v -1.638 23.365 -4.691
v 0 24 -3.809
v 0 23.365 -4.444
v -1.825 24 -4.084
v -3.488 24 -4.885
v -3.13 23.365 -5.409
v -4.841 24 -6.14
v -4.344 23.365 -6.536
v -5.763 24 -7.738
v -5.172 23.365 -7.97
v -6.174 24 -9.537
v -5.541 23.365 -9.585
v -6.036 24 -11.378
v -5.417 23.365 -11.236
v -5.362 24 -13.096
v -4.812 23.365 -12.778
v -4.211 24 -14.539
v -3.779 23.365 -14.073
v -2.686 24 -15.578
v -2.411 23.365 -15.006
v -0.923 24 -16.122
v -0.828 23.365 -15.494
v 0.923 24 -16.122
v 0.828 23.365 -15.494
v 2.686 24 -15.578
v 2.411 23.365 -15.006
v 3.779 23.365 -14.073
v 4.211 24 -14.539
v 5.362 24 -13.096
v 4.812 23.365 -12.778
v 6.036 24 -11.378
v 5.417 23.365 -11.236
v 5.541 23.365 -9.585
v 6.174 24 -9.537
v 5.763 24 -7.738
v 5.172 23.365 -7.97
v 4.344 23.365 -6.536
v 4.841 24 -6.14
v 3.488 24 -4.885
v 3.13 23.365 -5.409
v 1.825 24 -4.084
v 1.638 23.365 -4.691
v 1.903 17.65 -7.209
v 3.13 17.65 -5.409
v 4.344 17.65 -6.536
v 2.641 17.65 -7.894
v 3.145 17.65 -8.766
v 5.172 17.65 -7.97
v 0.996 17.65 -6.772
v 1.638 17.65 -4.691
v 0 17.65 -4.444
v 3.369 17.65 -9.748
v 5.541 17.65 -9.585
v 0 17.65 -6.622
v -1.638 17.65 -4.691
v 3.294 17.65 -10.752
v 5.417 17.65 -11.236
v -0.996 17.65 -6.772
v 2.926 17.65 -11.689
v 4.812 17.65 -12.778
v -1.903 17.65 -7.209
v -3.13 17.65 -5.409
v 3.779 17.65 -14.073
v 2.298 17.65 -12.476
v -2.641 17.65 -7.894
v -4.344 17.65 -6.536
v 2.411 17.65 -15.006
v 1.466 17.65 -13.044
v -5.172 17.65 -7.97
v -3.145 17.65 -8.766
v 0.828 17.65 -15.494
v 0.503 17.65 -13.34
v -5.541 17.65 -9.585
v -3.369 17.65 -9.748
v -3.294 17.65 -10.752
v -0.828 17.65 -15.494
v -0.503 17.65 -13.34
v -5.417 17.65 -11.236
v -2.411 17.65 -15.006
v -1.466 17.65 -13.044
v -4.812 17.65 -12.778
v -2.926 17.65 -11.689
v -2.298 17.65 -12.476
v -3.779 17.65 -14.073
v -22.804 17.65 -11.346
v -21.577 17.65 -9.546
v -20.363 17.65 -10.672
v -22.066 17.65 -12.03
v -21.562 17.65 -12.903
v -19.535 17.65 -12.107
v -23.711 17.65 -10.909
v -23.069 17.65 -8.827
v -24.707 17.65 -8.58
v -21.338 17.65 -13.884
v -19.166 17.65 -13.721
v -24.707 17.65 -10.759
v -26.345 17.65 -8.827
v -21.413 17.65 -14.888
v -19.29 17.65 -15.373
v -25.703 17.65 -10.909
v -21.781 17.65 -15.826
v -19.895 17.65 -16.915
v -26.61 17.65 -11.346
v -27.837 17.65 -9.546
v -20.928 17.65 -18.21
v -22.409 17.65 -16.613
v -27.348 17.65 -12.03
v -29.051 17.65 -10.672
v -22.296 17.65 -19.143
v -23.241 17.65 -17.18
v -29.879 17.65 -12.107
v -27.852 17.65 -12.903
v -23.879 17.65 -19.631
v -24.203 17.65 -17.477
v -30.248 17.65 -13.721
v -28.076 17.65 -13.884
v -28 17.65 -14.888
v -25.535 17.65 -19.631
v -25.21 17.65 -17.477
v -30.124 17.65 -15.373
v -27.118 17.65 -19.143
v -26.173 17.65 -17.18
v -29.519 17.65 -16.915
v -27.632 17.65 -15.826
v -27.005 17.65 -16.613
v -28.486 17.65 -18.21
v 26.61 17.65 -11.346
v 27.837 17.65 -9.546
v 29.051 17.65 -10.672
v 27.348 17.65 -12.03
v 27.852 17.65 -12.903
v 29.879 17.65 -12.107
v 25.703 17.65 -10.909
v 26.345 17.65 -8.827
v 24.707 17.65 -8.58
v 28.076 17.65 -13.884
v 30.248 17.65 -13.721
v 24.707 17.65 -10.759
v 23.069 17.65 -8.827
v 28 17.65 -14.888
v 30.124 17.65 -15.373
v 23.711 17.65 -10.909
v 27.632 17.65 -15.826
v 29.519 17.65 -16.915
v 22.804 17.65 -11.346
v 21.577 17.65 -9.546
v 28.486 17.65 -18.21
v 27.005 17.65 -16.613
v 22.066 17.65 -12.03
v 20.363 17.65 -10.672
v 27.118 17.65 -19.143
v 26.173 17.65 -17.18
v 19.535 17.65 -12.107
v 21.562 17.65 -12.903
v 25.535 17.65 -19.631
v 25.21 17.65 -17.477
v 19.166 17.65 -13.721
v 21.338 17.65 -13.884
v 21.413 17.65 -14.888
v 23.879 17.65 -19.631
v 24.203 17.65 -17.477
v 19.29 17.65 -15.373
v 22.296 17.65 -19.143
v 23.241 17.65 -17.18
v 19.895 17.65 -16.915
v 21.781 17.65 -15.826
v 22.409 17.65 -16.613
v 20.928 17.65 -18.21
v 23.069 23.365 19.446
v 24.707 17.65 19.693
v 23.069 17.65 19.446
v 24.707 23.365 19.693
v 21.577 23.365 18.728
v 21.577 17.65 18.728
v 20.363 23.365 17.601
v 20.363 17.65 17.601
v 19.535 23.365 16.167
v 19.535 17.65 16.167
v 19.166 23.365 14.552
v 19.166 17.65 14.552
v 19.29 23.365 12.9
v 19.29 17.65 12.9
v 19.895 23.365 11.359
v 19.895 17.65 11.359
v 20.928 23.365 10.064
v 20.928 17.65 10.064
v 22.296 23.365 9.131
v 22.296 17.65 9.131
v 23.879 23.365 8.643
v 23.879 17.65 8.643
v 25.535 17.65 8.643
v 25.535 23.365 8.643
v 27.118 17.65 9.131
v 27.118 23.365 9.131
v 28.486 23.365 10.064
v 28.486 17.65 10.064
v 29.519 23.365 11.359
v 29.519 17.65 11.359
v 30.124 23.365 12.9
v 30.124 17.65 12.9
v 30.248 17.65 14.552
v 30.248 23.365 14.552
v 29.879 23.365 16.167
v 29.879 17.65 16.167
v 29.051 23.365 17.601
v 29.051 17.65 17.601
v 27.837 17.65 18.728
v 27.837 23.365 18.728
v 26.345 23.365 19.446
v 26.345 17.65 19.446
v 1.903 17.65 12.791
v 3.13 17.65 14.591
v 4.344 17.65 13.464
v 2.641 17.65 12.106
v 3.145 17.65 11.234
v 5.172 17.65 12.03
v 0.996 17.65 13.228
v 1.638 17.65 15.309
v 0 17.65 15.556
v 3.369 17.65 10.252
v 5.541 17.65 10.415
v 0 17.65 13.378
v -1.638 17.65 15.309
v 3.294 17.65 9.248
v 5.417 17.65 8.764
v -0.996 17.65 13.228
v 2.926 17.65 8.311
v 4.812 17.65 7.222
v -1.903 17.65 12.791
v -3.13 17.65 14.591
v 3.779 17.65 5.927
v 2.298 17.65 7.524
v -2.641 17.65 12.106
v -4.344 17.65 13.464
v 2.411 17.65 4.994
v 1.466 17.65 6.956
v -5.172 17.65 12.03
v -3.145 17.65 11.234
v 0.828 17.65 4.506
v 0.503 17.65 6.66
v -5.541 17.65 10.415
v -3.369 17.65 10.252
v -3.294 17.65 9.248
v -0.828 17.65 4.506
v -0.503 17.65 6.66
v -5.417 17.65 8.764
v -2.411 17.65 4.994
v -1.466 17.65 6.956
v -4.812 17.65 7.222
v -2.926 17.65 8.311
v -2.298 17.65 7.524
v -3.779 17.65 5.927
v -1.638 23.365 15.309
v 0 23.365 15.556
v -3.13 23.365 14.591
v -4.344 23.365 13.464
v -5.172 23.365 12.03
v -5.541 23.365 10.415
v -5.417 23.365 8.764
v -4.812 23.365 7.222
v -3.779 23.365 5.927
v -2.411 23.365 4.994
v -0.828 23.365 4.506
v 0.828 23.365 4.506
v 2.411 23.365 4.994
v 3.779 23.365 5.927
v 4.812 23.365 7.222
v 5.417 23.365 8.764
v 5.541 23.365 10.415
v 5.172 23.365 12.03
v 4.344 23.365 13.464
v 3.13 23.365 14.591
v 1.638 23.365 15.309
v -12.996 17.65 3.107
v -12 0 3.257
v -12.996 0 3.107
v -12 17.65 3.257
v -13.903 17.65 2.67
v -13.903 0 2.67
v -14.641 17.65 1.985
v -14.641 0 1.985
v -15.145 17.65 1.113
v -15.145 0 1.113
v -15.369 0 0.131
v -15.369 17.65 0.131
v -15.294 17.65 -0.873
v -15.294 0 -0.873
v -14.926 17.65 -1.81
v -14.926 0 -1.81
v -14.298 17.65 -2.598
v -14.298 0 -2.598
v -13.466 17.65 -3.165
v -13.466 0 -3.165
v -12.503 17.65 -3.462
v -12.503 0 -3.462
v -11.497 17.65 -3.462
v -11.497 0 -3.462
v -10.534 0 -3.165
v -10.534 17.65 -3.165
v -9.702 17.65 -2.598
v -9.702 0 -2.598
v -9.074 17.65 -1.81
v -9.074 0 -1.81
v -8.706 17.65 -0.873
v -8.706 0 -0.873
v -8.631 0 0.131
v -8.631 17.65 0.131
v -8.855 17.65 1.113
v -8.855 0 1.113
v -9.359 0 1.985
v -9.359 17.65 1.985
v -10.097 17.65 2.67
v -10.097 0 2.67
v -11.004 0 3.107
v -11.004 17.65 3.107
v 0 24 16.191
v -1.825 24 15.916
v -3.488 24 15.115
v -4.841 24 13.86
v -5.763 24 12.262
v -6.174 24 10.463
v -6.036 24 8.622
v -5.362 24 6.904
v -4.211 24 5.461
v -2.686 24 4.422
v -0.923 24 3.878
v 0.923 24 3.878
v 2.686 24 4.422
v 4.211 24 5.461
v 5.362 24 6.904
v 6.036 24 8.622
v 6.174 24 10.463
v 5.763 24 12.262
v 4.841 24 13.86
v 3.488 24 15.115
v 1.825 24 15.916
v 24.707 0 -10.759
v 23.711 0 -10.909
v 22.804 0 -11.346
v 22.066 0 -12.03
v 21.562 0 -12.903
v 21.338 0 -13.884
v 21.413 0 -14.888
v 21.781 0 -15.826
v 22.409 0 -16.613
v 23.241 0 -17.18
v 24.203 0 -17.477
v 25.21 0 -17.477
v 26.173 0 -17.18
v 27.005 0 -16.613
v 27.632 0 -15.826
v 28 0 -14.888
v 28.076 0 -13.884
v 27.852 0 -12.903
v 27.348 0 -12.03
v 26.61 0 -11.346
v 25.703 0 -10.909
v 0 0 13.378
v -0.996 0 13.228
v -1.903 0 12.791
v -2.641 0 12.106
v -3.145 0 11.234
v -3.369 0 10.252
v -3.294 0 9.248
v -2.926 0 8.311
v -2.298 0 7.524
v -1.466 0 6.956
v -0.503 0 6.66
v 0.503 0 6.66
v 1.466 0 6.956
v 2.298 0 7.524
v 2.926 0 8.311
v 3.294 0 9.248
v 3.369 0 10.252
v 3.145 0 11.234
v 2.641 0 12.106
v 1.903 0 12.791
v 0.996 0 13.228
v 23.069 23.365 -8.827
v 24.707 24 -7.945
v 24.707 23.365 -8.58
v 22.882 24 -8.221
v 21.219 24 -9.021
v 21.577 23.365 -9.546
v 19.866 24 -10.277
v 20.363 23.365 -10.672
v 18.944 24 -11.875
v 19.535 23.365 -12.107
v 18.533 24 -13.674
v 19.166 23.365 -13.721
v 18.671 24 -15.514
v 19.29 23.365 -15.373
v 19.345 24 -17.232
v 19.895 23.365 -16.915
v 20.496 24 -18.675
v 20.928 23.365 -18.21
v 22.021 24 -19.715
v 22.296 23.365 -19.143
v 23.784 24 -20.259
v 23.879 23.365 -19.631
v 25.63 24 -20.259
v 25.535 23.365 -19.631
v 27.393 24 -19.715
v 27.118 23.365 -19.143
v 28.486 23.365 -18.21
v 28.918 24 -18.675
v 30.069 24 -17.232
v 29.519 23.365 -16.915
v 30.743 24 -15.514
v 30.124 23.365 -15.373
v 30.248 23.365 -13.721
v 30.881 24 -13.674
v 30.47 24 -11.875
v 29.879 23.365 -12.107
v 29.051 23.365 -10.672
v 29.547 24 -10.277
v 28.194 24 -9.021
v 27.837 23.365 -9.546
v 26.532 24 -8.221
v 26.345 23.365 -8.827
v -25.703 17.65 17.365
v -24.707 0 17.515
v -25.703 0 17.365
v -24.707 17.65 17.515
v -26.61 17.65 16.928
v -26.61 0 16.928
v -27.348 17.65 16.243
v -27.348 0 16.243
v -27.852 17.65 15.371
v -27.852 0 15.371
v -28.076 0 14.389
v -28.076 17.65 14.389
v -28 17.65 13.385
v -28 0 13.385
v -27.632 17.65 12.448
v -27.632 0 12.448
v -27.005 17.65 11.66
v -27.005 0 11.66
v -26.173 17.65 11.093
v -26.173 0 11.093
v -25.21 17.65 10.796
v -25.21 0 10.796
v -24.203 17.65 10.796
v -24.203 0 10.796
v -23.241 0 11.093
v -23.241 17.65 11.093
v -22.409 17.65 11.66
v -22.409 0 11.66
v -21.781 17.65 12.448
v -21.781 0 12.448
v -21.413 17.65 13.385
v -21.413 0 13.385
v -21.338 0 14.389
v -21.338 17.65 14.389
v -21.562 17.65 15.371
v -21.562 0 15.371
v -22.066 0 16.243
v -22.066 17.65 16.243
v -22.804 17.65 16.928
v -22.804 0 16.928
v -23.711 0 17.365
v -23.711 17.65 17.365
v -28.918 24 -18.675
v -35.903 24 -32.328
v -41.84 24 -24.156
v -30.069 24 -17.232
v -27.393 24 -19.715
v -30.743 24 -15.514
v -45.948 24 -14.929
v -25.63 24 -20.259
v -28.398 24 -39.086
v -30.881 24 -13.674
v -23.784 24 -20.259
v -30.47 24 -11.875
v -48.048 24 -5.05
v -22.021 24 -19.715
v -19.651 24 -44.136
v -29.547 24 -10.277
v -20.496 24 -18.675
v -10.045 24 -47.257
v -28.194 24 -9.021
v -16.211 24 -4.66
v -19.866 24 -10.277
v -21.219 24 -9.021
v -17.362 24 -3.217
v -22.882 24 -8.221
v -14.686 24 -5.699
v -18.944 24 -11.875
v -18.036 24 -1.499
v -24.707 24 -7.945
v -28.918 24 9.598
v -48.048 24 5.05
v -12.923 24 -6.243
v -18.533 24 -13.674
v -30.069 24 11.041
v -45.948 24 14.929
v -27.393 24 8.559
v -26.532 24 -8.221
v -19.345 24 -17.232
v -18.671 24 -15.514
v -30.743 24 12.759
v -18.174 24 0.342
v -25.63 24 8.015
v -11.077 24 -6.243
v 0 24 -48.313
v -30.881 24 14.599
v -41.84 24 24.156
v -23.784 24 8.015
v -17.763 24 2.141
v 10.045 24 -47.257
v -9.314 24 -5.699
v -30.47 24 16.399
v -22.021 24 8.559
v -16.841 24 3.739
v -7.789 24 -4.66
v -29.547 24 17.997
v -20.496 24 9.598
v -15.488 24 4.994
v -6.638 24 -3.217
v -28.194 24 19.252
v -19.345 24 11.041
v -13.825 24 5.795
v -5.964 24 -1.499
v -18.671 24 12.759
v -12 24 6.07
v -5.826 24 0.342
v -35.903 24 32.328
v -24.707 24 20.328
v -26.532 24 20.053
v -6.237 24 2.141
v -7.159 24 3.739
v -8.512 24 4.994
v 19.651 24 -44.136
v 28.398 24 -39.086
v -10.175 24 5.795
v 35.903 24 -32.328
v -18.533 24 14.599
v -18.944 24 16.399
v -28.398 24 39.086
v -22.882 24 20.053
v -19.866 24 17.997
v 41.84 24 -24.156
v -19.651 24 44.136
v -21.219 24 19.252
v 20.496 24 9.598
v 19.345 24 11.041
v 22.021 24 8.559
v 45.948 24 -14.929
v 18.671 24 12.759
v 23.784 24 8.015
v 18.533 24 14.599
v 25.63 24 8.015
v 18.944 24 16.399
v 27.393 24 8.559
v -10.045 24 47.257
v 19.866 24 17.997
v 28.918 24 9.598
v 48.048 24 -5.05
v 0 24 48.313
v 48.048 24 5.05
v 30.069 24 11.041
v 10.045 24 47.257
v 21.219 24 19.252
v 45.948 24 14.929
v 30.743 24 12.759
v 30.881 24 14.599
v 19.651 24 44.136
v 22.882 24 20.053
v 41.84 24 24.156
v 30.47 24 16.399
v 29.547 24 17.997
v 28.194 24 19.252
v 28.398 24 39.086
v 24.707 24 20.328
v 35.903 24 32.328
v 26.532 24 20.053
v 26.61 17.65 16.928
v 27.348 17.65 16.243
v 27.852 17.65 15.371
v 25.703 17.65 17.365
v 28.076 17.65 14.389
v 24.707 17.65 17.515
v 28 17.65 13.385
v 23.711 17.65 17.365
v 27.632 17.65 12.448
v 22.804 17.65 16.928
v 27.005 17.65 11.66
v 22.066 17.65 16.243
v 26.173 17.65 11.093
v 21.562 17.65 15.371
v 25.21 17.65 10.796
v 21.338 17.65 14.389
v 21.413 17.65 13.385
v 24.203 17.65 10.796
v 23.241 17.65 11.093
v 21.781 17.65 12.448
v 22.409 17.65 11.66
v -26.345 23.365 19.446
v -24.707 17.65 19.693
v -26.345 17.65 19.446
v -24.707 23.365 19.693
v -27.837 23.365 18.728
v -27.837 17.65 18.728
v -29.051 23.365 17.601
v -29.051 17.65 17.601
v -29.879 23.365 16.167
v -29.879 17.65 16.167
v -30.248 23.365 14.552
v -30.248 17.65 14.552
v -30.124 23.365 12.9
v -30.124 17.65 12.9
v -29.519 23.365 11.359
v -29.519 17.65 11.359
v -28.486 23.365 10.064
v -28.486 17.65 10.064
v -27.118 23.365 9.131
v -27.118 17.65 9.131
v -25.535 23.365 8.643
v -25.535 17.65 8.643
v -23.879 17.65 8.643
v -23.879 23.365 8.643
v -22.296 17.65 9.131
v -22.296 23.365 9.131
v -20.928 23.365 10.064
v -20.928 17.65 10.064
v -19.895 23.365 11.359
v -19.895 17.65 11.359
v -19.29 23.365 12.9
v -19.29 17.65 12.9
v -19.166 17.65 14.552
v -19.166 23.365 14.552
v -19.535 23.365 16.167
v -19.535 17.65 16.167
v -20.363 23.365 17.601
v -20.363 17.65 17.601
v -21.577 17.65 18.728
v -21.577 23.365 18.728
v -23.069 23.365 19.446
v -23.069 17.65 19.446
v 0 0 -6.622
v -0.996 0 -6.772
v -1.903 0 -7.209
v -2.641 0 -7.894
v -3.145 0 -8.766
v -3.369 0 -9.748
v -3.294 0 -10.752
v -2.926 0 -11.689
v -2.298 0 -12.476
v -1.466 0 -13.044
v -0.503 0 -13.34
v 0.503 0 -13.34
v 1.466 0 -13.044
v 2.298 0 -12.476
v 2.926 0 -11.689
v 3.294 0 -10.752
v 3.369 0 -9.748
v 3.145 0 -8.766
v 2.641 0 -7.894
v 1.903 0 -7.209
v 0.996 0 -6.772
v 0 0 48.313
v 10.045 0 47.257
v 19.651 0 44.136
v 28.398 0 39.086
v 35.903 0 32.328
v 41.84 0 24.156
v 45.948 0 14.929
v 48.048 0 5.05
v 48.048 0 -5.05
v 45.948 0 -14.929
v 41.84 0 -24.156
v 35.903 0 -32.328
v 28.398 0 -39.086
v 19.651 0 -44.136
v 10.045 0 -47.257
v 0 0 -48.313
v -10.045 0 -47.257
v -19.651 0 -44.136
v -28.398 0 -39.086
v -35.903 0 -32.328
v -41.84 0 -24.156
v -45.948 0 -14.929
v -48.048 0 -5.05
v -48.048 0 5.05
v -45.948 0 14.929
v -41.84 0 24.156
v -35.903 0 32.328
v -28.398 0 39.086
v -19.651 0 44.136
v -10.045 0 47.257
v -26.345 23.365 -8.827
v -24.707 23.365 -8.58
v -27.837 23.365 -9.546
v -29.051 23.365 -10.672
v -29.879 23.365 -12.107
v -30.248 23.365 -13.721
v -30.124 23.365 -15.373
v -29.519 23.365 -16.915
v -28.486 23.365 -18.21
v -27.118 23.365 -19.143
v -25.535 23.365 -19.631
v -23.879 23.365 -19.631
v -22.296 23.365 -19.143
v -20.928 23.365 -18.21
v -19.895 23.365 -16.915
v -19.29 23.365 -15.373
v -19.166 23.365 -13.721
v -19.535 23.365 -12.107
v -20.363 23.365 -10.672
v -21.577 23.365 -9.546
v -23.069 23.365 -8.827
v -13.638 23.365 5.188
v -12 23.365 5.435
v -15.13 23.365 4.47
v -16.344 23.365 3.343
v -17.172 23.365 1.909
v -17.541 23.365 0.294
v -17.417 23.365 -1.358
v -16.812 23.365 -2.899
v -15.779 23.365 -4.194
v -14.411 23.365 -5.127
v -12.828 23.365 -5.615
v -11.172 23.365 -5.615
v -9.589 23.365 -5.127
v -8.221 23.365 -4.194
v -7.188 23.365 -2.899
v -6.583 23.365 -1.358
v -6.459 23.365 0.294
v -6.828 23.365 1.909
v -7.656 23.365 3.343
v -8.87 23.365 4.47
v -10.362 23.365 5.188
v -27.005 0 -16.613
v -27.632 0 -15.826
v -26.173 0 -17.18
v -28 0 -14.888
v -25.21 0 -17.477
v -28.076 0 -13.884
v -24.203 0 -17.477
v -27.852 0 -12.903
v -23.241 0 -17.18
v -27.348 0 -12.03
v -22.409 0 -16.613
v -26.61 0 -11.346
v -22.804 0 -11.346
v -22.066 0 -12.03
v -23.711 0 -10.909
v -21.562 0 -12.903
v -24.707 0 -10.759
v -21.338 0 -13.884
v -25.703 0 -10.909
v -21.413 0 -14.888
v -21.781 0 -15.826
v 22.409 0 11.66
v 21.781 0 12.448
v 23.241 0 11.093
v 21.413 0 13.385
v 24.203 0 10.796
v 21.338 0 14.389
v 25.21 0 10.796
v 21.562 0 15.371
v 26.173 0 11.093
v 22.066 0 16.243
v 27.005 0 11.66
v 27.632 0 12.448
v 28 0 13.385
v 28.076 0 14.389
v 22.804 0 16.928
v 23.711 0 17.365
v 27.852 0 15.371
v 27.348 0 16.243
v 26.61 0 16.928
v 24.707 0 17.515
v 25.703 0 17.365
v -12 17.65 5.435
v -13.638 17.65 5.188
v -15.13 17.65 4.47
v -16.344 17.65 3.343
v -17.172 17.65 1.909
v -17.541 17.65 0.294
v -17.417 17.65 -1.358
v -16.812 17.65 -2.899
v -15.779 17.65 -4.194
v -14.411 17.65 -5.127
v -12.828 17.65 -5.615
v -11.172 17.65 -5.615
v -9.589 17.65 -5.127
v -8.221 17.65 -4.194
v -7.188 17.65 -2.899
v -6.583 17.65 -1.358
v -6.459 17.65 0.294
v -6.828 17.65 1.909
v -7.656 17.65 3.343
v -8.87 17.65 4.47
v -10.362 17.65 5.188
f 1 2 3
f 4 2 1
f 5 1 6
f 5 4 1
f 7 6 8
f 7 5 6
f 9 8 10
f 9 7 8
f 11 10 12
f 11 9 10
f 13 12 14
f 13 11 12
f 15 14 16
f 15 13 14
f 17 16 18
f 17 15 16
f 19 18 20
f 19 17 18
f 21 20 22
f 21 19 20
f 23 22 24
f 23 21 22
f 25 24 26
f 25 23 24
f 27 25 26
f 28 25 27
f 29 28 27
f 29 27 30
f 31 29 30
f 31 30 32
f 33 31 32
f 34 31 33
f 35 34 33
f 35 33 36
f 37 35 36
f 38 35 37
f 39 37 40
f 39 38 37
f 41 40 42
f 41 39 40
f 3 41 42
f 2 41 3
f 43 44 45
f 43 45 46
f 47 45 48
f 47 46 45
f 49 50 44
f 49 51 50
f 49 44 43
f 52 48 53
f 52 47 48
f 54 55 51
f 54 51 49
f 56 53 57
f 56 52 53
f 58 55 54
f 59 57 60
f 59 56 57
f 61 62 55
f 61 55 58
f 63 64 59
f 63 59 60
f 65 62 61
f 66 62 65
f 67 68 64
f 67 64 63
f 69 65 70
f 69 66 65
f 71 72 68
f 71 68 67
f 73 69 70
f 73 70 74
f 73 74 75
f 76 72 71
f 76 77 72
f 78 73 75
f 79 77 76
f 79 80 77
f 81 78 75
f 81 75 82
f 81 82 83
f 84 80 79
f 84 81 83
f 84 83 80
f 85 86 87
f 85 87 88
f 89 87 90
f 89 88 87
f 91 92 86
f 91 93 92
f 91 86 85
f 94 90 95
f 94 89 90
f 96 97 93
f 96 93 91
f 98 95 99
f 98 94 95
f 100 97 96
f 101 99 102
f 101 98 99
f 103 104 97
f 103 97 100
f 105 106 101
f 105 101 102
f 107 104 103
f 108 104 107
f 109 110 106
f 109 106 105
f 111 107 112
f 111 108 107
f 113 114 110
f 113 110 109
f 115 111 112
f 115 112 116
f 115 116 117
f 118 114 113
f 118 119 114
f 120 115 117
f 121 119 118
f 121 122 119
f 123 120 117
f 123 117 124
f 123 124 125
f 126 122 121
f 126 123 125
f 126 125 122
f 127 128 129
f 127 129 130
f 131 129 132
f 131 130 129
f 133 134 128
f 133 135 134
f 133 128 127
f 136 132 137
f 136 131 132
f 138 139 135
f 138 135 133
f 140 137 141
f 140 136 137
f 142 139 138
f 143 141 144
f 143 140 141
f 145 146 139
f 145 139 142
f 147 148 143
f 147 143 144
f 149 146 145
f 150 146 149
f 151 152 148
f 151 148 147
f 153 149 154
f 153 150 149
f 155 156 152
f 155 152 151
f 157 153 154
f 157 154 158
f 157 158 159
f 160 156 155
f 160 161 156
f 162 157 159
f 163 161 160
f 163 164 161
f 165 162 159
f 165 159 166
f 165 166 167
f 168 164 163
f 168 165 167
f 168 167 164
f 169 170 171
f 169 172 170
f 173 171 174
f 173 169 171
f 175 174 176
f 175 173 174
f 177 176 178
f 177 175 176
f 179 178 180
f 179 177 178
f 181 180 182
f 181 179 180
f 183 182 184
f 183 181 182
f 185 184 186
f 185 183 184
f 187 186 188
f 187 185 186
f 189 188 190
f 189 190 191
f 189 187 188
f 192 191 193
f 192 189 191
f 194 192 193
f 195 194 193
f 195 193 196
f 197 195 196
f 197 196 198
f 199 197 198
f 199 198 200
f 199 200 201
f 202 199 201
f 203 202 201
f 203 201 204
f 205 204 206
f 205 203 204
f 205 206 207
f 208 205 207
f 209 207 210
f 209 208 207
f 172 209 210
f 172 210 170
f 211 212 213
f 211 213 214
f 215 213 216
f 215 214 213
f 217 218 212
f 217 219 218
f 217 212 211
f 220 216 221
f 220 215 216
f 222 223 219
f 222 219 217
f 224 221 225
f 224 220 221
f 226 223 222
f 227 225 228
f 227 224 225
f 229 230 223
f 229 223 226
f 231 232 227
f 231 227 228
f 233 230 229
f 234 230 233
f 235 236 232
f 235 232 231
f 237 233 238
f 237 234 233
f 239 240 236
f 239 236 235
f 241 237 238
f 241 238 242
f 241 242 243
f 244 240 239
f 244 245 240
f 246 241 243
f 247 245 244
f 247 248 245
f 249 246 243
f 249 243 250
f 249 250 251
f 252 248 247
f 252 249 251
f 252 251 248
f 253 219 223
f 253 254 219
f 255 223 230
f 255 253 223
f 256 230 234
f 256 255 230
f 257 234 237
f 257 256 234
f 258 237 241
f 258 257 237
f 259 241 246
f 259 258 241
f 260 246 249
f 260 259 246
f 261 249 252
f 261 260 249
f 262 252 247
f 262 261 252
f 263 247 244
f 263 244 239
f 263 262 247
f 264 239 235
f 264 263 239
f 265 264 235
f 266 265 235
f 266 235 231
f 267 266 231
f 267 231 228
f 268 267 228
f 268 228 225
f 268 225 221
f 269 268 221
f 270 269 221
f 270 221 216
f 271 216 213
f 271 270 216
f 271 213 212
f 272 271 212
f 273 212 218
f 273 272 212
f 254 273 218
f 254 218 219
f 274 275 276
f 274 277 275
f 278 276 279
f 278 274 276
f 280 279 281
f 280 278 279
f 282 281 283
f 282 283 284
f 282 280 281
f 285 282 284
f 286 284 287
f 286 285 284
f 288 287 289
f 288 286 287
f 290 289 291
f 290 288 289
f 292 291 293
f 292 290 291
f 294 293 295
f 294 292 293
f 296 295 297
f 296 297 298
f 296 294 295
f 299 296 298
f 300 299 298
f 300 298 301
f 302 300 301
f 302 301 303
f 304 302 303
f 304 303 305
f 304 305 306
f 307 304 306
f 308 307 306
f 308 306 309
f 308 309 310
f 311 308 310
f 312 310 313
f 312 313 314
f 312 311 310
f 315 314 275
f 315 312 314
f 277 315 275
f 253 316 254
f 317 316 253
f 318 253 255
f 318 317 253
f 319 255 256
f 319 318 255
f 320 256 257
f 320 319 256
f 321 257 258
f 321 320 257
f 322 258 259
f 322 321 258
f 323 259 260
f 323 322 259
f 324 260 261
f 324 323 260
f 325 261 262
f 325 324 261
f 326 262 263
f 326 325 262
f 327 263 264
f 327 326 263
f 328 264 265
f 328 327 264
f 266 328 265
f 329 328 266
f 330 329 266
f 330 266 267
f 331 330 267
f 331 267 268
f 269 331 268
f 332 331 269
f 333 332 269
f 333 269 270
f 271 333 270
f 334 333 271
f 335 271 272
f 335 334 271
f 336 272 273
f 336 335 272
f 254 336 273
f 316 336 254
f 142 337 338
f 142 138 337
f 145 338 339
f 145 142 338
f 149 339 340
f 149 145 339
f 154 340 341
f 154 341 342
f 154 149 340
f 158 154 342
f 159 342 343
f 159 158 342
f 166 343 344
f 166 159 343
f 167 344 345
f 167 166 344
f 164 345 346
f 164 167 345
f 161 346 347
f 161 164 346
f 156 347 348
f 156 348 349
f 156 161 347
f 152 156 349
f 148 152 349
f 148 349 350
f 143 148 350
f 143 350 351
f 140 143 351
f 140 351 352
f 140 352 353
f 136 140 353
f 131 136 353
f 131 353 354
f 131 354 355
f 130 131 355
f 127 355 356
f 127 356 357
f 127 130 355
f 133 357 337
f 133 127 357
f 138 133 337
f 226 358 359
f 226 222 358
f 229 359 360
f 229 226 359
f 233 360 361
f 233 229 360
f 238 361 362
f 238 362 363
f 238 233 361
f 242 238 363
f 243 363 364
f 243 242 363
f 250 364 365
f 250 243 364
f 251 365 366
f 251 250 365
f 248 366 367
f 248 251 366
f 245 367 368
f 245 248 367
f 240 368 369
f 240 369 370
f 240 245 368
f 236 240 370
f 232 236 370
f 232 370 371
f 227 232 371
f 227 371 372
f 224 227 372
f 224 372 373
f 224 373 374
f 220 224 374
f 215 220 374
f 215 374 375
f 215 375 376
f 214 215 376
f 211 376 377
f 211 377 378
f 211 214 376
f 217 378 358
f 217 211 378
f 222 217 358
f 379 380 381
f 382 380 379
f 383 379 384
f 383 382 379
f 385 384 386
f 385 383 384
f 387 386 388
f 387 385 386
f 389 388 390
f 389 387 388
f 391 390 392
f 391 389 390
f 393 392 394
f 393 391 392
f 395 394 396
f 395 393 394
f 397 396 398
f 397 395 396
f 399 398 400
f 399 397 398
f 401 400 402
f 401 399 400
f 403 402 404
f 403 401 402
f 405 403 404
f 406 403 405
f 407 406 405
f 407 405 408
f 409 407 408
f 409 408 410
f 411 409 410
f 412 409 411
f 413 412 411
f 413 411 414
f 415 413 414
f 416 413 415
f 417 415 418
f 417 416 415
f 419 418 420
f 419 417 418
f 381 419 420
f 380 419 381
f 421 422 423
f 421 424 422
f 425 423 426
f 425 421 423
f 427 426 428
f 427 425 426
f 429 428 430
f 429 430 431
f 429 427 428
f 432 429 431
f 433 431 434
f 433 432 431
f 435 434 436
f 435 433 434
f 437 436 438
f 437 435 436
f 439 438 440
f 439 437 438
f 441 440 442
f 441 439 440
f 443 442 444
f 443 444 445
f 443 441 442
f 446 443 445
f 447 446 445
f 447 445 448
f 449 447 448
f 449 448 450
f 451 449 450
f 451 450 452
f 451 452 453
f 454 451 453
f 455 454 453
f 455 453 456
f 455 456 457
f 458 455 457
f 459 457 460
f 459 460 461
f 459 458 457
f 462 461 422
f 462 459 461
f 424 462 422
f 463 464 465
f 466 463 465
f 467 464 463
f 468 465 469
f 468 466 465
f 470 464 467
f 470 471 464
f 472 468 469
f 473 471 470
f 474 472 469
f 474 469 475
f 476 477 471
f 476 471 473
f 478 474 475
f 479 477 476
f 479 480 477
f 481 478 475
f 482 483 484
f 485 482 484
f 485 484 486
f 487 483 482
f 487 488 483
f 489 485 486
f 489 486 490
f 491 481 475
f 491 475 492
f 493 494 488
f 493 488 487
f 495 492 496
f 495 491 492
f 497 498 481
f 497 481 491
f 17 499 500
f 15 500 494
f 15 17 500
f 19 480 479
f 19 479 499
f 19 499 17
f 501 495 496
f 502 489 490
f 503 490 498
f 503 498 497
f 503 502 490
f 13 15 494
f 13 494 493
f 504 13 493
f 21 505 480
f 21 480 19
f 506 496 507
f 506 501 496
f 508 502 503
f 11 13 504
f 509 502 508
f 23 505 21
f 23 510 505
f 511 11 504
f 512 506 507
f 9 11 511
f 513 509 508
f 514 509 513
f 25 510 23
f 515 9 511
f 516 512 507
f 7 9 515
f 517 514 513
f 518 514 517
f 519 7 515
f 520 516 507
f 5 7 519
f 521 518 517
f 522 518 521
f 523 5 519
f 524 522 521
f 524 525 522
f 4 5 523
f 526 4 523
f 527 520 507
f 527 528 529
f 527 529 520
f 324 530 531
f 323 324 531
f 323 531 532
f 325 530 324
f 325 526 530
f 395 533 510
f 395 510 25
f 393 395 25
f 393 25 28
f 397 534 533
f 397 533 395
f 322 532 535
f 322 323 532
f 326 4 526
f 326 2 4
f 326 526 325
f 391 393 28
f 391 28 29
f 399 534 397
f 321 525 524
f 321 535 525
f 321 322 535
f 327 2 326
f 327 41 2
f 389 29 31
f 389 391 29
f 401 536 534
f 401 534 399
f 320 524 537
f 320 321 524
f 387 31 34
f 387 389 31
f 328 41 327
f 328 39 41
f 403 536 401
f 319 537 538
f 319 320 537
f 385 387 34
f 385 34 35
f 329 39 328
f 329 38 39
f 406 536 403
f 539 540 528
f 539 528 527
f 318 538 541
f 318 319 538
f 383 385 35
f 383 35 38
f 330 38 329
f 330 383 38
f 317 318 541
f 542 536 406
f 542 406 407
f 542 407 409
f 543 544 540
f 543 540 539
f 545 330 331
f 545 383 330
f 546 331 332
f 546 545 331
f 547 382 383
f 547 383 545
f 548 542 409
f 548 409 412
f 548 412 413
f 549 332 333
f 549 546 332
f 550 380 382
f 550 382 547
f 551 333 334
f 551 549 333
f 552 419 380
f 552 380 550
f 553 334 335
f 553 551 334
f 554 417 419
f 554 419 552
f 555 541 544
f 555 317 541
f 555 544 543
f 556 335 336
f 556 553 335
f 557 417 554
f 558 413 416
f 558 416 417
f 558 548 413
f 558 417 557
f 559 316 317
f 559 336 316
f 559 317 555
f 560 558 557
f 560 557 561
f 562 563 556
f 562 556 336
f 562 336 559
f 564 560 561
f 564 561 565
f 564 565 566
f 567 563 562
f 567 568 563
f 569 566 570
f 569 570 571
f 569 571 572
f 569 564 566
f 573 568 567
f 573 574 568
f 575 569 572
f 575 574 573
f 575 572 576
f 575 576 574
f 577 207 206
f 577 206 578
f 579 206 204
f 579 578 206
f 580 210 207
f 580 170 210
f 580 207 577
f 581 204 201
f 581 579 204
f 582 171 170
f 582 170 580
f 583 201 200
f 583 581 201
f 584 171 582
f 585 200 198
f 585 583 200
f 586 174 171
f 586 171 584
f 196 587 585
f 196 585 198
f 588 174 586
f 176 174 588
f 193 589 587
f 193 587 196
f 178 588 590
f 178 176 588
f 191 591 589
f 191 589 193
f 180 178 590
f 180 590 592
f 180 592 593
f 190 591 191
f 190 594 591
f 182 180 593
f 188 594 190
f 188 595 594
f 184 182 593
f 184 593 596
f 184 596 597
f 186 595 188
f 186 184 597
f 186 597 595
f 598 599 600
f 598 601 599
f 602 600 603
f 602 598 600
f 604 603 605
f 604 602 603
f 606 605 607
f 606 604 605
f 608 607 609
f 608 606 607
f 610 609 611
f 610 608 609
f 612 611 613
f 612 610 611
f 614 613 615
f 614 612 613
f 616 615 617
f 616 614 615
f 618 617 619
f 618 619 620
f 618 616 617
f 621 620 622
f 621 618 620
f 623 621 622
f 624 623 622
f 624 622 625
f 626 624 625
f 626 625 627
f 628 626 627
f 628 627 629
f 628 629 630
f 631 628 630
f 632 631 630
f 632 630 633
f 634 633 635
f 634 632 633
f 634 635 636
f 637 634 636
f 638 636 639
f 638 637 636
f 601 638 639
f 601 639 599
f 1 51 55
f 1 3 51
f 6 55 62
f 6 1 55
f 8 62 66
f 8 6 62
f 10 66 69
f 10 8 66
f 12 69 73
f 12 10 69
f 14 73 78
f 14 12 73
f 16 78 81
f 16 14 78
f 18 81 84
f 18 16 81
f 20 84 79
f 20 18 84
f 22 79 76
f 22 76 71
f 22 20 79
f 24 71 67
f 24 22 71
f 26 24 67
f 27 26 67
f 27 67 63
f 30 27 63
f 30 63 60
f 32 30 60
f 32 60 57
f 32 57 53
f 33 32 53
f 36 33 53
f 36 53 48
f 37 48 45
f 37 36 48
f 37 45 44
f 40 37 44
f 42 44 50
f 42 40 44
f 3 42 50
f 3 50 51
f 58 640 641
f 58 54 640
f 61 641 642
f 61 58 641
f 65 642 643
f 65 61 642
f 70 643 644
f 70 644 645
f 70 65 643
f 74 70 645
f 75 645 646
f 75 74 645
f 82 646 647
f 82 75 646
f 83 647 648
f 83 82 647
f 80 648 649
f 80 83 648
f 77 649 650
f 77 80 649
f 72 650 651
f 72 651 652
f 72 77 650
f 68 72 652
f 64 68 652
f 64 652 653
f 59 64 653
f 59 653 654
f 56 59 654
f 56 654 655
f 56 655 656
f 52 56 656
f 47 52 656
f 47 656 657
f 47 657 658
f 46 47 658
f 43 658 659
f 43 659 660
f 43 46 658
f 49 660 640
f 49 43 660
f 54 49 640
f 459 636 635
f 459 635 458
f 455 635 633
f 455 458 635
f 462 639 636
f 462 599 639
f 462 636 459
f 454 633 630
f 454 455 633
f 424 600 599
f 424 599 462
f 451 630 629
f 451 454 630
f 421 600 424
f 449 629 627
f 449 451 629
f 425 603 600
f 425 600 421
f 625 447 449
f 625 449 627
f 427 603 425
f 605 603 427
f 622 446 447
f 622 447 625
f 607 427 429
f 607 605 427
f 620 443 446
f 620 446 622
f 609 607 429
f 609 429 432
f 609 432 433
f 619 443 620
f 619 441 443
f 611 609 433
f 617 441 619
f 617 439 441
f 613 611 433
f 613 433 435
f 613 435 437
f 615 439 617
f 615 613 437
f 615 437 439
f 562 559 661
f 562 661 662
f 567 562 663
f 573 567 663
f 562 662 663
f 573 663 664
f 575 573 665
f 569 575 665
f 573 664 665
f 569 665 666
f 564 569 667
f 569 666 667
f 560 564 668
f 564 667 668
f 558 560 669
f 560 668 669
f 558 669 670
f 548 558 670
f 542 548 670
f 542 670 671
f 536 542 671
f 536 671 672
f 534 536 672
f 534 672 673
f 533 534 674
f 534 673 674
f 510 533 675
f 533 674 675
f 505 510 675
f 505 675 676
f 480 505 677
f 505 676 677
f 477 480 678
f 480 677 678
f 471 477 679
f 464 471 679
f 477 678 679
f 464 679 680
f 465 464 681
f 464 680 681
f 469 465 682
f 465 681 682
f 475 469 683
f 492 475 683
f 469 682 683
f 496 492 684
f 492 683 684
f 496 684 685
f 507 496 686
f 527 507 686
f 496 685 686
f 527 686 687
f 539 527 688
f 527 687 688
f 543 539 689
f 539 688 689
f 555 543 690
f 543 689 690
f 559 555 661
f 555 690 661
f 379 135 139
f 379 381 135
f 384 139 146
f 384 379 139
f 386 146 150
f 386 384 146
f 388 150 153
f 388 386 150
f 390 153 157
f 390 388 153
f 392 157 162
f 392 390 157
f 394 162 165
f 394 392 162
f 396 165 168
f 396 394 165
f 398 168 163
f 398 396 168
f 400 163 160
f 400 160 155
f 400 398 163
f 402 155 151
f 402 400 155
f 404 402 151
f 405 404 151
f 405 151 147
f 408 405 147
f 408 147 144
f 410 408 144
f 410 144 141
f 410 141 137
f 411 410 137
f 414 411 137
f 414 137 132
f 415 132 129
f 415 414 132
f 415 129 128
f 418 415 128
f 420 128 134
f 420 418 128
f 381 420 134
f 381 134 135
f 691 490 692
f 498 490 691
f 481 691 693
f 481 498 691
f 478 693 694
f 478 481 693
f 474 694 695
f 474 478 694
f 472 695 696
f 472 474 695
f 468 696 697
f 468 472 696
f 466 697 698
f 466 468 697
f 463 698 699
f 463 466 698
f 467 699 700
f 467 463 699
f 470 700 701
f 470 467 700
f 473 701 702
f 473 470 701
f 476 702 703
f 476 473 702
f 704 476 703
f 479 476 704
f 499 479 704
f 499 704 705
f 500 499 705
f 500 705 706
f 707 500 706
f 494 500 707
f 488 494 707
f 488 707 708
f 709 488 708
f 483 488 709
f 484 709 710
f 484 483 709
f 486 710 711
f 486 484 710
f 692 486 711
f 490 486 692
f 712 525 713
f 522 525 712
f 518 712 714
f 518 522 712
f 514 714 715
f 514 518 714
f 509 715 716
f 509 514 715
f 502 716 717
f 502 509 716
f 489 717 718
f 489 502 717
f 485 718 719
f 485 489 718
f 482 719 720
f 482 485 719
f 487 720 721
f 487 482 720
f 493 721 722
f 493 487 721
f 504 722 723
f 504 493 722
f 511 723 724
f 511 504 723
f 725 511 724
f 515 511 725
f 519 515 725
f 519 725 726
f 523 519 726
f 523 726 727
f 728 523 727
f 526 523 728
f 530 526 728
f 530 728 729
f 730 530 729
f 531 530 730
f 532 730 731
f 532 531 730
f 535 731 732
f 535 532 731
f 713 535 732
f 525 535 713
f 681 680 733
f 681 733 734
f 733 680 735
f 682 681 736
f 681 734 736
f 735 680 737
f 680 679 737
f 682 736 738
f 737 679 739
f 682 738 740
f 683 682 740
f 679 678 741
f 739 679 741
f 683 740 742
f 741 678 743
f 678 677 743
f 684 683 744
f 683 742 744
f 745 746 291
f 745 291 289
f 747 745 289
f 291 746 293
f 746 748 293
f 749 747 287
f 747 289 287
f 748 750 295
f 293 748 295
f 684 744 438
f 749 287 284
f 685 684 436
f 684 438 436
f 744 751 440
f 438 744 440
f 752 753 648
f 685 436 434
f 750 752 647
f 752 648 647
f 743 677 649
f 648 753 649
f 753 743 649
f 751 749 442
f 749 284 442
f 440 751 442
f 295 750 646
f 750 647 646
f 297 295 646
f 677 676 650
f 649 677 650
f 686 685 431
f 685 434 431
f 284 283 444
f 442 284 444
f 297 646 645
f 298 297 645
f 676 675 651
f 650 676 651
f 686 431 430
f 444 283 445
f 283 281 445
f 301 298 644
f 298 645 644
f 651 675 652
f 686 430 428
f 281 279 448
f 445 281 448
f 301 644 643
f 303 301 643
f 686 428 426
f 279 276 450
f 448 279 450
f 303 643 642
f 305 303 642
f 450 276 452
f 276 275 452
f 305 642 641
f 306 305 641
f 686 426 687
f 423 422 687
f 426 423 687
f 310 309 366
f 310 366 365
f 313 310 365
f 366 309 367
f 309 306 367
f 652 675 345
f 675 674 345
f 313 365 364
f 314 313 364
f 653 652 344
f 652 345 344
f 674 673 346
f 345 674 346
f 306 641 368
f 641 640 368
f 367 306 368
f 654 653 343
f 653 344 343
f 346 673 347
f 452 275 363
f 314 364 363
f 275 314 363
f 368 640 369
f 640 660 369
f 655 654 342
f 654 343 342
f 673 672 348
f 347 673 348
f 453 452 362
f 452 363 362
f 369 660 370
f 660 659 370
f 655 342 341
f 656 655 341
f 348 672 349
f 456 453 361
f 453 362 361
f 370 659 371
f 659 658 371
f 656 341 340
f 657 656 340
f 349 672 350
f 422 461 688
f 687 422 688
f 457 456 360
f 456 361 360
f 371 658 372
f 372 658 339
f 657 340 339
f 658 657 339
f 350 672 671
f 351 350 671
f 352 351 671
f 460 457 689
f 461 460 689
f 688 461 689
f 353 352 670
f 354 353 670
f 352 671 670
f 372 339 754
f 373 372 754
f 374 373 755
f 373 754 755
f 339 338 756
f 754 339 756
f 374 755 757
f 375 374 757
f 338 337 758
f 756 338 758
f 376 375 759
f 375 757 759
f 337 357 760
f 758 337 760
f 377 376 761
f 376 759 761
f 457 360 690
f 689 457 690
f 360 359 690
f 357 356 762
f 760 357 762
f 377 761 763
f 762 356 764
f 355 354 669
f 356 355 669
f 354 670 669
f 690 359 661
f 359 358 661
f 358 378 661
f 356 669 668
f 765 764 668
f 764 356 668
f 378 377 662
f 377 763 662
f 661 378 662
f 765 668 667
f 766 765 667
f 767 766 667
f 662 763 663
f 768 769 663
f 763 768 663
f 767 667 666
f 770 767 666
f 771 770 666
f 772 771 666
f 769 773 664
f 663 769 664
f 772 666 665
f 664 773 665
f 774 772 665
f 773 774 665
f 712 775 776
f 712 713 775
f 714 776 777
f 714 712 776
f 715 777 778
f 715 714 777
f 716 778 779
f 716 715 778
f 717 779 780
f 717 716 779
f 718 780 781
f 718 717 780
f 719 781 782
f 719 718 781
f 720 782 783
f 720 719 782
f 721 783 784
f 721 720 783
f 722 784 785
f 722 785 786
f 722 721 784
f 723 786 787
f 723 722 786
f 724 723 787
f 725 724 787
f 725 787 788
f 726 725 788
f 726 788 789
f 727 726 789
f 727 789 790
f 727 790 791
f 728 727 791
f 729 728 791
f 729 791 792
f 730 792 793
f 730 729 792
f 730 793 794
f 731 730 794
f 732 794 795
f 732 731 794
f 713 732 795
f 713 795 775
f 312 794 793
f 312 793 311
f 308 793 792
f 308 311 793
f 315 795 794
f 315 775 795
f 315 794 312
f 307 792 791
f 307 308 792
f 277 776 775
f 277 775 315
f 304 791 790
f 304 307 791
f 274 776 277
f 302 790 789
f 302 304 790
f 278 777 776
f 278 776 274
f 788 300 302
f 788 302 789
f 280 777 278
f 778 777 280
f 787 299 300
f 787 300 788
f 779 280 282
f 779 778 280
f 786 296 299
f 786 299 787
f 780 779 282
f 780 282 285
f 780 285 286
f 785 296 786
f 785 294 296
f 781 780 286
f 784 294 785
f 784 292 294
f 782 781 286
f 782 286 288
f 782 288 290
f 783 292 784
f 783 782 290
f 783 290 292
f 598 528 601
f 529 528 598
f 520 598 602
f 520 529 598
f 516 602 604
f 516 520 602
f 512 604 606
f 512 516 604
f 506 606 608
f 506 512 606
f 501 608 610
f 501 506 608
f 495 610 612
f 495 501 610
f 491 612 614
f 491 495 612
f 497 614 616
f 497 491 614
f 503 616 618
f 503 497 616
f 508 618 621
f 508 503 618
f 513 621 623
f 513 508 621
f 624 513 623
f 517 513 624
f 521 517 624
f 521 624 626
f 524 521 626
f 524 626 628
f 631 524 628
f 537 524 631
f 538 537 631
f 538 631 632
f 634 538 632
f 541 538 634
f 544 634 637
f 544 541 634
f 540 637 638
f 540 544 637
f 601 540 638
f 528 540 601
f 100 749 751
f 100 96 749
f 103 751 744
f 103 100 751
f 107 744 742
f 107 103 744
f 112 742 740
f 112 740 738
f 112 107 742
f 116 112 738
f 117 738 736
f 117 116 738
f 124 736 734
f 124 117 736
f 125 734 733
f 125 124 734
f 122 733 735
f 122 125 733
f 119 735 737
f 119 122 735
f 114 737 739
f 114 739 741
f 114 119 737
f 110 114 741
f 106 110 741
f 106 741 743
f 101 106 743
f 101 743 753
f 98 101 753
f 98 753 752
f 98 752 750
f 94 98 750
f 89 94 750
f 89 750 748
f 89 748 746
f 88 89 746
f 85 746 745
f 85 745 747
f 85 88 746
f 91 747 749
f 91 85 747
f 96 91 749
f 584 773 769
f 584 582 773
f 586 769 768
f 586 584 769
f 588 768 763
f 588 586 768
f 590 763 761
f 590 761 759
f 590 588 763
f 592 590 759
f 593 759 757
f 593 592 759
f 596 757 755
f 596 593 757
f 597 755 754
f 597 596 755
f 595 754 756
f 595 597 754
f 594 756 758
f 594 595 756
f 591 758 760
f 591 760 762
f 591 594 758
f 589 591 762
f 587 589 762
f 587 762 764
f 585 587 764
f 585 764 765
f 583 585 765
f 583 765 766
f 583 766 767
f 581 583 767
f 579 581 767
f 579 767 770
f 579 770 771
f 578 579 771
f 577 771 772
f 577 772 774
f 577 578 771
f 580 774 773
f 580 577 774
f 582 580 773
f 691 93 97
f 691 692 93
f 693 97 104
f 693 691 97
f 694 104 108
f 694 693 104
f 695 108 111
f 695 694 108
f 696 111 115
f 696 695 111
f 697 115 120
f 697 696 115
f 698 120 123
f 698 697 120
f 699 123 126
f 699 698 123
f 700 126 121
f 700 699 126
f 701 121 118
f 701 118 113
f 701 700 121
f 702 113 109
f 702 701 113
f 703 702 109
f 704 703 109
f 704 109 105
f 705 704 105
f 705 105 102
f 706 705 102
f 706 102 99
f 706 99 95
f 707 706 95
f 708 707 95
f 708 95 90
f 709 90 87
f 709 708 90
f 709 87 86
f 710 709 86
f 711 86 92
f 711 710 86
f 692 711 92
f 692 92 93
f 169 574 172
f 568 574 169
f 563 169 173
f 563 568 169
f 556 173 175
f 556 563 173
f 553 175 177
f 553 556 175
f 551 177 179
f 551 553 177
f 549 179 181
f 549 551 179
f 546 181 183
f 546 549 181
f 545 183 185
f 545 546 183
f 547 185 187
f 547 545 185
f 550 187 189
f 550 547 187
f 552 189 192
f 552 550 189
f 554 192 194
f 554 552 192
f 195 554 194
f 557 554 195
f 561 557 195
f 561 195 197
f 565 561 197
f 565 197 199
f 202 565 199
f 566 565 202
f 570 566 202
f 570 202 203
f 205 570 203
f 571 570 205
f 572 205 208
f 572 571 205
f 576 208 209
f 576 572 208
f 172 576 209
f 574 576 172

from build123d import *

# Parameters (mm, degrees)
SKETCH1_R                                     = 48.312804733
BOSS_EXTRUDE1_DEPTH                           = 24
CBORE_FOR_1_4_SOCKET_HEAD_CAP_SCREW1_AT_COUNT = 2
CBORE_FOR_1_4_SOCKET_HEAD_CAP_SCREW1_AT_PITCH = 25.050748534
CBORE_FOR_1_4_SOCKET_HEAD_CAP_SCREW1_2_COUNT  = 2
CBORE_FOR_1_4_SOCKET_HEAD_CAP_SCREW1_2_PITCH  = 34.539958202
CBORE_FOR_1_4_SOCKET_HEAD_CAP_SCREW1_3_COUNT  = 2
CBORE_FOR_1_4_SOCKET_HEAD_CAP_SCREW1_3_PITCH  = 34.539958202
CBORE_FOR_1_4_SOCKET_HEAD_CAP_SCREW1_4_COUNT  = 2
CBORE_FOR_1_4_SOCKET_HEAD_CAP_SCREW1_4_PITCH  = 20
CBORE_FOR_1_4_SOCKET_HEAD_CAP_SCREW1_5_COUNT  = 2
CBORE_FOR_1_4_SOCKET_HEAD_CAP_SCREW1_5_PITCH  = 25.050748534
CBORE_FOR_1_4_SOCKET_HEAD_CAP_SCREW1_6_COUNT  = 2
CBORE_FOR_1_4_SOCKET_HEAD_CAP_SCREW1_6_PITCH  = 15.698328502


with BuildPart() as part:
    # Sketch1 → Boss-Extrude1 (new body)
    with BuildSketch(Plane(origin=(0, 0, 0), x_dir=(1, 0, 0), z_dir=(0, 1, 0))):
        with Locations(Location((0, 0, 0), (0, 0, 270))):
            Circle(SKETCH1_R)
    extrude(amount=BOSS_EXTRUDE1_DEPTH)

    # Sketch3 → CBORE for 1/4 Socket Head Cap Screw1 (revolve, cut)
    with BuildSketch(Plane(origin=(0, 24, 10), x_dir=(0, 0, 1), z_dir=(1, 0, 0))):
        Polygon((0, 0), (0, 24), (3.3782, 24), (3.3782, 6.35), (5.55625, 6.35), (5.55625, 0.635), (6.19125, 0), align=None)
    cbore_for_1_4_socket_head_cap_screw1 = revolve(axis=Axis((0, 30.35, 10), (0, -1, 0)), mode=Mode.SUBTRACT)

    # CBORE for 1/4 Socket Head Cap Screw1 at: CBORE for 1/4 Socket Head Cap Screw1 ×2
    with Locations(*[Vector(-0.9862712240770178, 0, 0.16513349919874187) * (i * CBORE_FOR_1_4_SOCKET_HEAD_CAP_SCREW1_AT_PITCH) for i in range(1, CBORE_FOR_1_4_SOCKET_HEAD_CAP_SCREW1_AT_COUNT)]):
        add(cbore_for_1_4_socket_head_cap_screw1, mode=Mode.SUBTRACT)

    # CBORE for 1_4 Socket Head Cap Screw1 2: CBORE for 1/4 Socket Head Cap Screw1 ×2
    with Locations(*[Vector(-0.7153115900071431, 0, -0.6988056447979316) * (i * CBORE_FOR_1_4_SOCKET_HEAD_CAP_SCREW1_2_PITCH) for i in range(1, CBORE_FOR_1_4_SOCKET_HEAD_CAP_SCREW1_2_COUNT)]):
        add(cbore_for_1_4_socket_head_cap_screw1, mode=Mode.SUBTRACT)

    # CBORE for 1_4 Socket Head Cap Screw1 3: CBORE for 1/4 Socket Head Cap Screw1 ×2
    with Locations(*[Vector(0.7153115900071431, 0, -0.6988056447979316) * (i * CBORE_FOR_1_4_SOCKET_HEAD_CAP_SCREW1_3_PITCH) for i in range(1, CBORE_FOR_1_4_SOCKET_HEAD_CAP_SCREW1_3_COUNT)]):
        add(cbore_for_1_4_socket_head_cap_screw1, mode=Mode.SUBTRACT)

    # CBORE for 1_4 Socket Head Cap Screw1 4: CBORE for 1/4 Socket Head Cap Screw1 ×2
    with Locations(*[(0, 0, -i * CBORE_FOR_1_4_SOCKET_HEAD_CAP_SCREW1_4_PITCH) for i in range(1, CBORE_FOR_1_4_SOCKET_HEAD_CAP_SCREW1_4_COUNT)]):
        add(cbore_for_1_4_socket_head_cap_screw1, mode=Mode.SUBTRACT)

    # CBORE for 1_4 Socket Head Cap Screw1 5: CBORE for 1/4 Socket Head Cap Screw1 ×2
    with Locations(*[Vector(0.9862712240770178, 0, 0.16513349919874187) * (i * CBORE_FOR_1_4_SOCKET_HEAD_CAP_SCREW1_5_PITCH) for i in range(1, CBORE_FOR_1_4_SOCKET_HEAD_CAP_SCREW1_5_COUNT)]):
        add(cbore_for_1_4_socket_head_cap_screw1, mode=Mode.SUBTRACT)

    # CBORE for 1_4 Socket Head Cap Screw1 6: CBORE for 1/4 Socket Head Cap Screw1 ×2
    with Locations(*[Vector(-0.7644125932390737, 0, -0.6447273743975157) * (i * CBORE_FOR_1_4_SOCKET_HEAD_CAP_SCREW1_6_PITCH) for i in range(1, CBORE_FOR_1_4_SOCKET_HEAD_CAP_SCREW1_6_COUNT)]):
        add(cbore_for_1_4_socket_head_cap_screw1, mode=Mode.SUBTRACT)


solid = part.part
